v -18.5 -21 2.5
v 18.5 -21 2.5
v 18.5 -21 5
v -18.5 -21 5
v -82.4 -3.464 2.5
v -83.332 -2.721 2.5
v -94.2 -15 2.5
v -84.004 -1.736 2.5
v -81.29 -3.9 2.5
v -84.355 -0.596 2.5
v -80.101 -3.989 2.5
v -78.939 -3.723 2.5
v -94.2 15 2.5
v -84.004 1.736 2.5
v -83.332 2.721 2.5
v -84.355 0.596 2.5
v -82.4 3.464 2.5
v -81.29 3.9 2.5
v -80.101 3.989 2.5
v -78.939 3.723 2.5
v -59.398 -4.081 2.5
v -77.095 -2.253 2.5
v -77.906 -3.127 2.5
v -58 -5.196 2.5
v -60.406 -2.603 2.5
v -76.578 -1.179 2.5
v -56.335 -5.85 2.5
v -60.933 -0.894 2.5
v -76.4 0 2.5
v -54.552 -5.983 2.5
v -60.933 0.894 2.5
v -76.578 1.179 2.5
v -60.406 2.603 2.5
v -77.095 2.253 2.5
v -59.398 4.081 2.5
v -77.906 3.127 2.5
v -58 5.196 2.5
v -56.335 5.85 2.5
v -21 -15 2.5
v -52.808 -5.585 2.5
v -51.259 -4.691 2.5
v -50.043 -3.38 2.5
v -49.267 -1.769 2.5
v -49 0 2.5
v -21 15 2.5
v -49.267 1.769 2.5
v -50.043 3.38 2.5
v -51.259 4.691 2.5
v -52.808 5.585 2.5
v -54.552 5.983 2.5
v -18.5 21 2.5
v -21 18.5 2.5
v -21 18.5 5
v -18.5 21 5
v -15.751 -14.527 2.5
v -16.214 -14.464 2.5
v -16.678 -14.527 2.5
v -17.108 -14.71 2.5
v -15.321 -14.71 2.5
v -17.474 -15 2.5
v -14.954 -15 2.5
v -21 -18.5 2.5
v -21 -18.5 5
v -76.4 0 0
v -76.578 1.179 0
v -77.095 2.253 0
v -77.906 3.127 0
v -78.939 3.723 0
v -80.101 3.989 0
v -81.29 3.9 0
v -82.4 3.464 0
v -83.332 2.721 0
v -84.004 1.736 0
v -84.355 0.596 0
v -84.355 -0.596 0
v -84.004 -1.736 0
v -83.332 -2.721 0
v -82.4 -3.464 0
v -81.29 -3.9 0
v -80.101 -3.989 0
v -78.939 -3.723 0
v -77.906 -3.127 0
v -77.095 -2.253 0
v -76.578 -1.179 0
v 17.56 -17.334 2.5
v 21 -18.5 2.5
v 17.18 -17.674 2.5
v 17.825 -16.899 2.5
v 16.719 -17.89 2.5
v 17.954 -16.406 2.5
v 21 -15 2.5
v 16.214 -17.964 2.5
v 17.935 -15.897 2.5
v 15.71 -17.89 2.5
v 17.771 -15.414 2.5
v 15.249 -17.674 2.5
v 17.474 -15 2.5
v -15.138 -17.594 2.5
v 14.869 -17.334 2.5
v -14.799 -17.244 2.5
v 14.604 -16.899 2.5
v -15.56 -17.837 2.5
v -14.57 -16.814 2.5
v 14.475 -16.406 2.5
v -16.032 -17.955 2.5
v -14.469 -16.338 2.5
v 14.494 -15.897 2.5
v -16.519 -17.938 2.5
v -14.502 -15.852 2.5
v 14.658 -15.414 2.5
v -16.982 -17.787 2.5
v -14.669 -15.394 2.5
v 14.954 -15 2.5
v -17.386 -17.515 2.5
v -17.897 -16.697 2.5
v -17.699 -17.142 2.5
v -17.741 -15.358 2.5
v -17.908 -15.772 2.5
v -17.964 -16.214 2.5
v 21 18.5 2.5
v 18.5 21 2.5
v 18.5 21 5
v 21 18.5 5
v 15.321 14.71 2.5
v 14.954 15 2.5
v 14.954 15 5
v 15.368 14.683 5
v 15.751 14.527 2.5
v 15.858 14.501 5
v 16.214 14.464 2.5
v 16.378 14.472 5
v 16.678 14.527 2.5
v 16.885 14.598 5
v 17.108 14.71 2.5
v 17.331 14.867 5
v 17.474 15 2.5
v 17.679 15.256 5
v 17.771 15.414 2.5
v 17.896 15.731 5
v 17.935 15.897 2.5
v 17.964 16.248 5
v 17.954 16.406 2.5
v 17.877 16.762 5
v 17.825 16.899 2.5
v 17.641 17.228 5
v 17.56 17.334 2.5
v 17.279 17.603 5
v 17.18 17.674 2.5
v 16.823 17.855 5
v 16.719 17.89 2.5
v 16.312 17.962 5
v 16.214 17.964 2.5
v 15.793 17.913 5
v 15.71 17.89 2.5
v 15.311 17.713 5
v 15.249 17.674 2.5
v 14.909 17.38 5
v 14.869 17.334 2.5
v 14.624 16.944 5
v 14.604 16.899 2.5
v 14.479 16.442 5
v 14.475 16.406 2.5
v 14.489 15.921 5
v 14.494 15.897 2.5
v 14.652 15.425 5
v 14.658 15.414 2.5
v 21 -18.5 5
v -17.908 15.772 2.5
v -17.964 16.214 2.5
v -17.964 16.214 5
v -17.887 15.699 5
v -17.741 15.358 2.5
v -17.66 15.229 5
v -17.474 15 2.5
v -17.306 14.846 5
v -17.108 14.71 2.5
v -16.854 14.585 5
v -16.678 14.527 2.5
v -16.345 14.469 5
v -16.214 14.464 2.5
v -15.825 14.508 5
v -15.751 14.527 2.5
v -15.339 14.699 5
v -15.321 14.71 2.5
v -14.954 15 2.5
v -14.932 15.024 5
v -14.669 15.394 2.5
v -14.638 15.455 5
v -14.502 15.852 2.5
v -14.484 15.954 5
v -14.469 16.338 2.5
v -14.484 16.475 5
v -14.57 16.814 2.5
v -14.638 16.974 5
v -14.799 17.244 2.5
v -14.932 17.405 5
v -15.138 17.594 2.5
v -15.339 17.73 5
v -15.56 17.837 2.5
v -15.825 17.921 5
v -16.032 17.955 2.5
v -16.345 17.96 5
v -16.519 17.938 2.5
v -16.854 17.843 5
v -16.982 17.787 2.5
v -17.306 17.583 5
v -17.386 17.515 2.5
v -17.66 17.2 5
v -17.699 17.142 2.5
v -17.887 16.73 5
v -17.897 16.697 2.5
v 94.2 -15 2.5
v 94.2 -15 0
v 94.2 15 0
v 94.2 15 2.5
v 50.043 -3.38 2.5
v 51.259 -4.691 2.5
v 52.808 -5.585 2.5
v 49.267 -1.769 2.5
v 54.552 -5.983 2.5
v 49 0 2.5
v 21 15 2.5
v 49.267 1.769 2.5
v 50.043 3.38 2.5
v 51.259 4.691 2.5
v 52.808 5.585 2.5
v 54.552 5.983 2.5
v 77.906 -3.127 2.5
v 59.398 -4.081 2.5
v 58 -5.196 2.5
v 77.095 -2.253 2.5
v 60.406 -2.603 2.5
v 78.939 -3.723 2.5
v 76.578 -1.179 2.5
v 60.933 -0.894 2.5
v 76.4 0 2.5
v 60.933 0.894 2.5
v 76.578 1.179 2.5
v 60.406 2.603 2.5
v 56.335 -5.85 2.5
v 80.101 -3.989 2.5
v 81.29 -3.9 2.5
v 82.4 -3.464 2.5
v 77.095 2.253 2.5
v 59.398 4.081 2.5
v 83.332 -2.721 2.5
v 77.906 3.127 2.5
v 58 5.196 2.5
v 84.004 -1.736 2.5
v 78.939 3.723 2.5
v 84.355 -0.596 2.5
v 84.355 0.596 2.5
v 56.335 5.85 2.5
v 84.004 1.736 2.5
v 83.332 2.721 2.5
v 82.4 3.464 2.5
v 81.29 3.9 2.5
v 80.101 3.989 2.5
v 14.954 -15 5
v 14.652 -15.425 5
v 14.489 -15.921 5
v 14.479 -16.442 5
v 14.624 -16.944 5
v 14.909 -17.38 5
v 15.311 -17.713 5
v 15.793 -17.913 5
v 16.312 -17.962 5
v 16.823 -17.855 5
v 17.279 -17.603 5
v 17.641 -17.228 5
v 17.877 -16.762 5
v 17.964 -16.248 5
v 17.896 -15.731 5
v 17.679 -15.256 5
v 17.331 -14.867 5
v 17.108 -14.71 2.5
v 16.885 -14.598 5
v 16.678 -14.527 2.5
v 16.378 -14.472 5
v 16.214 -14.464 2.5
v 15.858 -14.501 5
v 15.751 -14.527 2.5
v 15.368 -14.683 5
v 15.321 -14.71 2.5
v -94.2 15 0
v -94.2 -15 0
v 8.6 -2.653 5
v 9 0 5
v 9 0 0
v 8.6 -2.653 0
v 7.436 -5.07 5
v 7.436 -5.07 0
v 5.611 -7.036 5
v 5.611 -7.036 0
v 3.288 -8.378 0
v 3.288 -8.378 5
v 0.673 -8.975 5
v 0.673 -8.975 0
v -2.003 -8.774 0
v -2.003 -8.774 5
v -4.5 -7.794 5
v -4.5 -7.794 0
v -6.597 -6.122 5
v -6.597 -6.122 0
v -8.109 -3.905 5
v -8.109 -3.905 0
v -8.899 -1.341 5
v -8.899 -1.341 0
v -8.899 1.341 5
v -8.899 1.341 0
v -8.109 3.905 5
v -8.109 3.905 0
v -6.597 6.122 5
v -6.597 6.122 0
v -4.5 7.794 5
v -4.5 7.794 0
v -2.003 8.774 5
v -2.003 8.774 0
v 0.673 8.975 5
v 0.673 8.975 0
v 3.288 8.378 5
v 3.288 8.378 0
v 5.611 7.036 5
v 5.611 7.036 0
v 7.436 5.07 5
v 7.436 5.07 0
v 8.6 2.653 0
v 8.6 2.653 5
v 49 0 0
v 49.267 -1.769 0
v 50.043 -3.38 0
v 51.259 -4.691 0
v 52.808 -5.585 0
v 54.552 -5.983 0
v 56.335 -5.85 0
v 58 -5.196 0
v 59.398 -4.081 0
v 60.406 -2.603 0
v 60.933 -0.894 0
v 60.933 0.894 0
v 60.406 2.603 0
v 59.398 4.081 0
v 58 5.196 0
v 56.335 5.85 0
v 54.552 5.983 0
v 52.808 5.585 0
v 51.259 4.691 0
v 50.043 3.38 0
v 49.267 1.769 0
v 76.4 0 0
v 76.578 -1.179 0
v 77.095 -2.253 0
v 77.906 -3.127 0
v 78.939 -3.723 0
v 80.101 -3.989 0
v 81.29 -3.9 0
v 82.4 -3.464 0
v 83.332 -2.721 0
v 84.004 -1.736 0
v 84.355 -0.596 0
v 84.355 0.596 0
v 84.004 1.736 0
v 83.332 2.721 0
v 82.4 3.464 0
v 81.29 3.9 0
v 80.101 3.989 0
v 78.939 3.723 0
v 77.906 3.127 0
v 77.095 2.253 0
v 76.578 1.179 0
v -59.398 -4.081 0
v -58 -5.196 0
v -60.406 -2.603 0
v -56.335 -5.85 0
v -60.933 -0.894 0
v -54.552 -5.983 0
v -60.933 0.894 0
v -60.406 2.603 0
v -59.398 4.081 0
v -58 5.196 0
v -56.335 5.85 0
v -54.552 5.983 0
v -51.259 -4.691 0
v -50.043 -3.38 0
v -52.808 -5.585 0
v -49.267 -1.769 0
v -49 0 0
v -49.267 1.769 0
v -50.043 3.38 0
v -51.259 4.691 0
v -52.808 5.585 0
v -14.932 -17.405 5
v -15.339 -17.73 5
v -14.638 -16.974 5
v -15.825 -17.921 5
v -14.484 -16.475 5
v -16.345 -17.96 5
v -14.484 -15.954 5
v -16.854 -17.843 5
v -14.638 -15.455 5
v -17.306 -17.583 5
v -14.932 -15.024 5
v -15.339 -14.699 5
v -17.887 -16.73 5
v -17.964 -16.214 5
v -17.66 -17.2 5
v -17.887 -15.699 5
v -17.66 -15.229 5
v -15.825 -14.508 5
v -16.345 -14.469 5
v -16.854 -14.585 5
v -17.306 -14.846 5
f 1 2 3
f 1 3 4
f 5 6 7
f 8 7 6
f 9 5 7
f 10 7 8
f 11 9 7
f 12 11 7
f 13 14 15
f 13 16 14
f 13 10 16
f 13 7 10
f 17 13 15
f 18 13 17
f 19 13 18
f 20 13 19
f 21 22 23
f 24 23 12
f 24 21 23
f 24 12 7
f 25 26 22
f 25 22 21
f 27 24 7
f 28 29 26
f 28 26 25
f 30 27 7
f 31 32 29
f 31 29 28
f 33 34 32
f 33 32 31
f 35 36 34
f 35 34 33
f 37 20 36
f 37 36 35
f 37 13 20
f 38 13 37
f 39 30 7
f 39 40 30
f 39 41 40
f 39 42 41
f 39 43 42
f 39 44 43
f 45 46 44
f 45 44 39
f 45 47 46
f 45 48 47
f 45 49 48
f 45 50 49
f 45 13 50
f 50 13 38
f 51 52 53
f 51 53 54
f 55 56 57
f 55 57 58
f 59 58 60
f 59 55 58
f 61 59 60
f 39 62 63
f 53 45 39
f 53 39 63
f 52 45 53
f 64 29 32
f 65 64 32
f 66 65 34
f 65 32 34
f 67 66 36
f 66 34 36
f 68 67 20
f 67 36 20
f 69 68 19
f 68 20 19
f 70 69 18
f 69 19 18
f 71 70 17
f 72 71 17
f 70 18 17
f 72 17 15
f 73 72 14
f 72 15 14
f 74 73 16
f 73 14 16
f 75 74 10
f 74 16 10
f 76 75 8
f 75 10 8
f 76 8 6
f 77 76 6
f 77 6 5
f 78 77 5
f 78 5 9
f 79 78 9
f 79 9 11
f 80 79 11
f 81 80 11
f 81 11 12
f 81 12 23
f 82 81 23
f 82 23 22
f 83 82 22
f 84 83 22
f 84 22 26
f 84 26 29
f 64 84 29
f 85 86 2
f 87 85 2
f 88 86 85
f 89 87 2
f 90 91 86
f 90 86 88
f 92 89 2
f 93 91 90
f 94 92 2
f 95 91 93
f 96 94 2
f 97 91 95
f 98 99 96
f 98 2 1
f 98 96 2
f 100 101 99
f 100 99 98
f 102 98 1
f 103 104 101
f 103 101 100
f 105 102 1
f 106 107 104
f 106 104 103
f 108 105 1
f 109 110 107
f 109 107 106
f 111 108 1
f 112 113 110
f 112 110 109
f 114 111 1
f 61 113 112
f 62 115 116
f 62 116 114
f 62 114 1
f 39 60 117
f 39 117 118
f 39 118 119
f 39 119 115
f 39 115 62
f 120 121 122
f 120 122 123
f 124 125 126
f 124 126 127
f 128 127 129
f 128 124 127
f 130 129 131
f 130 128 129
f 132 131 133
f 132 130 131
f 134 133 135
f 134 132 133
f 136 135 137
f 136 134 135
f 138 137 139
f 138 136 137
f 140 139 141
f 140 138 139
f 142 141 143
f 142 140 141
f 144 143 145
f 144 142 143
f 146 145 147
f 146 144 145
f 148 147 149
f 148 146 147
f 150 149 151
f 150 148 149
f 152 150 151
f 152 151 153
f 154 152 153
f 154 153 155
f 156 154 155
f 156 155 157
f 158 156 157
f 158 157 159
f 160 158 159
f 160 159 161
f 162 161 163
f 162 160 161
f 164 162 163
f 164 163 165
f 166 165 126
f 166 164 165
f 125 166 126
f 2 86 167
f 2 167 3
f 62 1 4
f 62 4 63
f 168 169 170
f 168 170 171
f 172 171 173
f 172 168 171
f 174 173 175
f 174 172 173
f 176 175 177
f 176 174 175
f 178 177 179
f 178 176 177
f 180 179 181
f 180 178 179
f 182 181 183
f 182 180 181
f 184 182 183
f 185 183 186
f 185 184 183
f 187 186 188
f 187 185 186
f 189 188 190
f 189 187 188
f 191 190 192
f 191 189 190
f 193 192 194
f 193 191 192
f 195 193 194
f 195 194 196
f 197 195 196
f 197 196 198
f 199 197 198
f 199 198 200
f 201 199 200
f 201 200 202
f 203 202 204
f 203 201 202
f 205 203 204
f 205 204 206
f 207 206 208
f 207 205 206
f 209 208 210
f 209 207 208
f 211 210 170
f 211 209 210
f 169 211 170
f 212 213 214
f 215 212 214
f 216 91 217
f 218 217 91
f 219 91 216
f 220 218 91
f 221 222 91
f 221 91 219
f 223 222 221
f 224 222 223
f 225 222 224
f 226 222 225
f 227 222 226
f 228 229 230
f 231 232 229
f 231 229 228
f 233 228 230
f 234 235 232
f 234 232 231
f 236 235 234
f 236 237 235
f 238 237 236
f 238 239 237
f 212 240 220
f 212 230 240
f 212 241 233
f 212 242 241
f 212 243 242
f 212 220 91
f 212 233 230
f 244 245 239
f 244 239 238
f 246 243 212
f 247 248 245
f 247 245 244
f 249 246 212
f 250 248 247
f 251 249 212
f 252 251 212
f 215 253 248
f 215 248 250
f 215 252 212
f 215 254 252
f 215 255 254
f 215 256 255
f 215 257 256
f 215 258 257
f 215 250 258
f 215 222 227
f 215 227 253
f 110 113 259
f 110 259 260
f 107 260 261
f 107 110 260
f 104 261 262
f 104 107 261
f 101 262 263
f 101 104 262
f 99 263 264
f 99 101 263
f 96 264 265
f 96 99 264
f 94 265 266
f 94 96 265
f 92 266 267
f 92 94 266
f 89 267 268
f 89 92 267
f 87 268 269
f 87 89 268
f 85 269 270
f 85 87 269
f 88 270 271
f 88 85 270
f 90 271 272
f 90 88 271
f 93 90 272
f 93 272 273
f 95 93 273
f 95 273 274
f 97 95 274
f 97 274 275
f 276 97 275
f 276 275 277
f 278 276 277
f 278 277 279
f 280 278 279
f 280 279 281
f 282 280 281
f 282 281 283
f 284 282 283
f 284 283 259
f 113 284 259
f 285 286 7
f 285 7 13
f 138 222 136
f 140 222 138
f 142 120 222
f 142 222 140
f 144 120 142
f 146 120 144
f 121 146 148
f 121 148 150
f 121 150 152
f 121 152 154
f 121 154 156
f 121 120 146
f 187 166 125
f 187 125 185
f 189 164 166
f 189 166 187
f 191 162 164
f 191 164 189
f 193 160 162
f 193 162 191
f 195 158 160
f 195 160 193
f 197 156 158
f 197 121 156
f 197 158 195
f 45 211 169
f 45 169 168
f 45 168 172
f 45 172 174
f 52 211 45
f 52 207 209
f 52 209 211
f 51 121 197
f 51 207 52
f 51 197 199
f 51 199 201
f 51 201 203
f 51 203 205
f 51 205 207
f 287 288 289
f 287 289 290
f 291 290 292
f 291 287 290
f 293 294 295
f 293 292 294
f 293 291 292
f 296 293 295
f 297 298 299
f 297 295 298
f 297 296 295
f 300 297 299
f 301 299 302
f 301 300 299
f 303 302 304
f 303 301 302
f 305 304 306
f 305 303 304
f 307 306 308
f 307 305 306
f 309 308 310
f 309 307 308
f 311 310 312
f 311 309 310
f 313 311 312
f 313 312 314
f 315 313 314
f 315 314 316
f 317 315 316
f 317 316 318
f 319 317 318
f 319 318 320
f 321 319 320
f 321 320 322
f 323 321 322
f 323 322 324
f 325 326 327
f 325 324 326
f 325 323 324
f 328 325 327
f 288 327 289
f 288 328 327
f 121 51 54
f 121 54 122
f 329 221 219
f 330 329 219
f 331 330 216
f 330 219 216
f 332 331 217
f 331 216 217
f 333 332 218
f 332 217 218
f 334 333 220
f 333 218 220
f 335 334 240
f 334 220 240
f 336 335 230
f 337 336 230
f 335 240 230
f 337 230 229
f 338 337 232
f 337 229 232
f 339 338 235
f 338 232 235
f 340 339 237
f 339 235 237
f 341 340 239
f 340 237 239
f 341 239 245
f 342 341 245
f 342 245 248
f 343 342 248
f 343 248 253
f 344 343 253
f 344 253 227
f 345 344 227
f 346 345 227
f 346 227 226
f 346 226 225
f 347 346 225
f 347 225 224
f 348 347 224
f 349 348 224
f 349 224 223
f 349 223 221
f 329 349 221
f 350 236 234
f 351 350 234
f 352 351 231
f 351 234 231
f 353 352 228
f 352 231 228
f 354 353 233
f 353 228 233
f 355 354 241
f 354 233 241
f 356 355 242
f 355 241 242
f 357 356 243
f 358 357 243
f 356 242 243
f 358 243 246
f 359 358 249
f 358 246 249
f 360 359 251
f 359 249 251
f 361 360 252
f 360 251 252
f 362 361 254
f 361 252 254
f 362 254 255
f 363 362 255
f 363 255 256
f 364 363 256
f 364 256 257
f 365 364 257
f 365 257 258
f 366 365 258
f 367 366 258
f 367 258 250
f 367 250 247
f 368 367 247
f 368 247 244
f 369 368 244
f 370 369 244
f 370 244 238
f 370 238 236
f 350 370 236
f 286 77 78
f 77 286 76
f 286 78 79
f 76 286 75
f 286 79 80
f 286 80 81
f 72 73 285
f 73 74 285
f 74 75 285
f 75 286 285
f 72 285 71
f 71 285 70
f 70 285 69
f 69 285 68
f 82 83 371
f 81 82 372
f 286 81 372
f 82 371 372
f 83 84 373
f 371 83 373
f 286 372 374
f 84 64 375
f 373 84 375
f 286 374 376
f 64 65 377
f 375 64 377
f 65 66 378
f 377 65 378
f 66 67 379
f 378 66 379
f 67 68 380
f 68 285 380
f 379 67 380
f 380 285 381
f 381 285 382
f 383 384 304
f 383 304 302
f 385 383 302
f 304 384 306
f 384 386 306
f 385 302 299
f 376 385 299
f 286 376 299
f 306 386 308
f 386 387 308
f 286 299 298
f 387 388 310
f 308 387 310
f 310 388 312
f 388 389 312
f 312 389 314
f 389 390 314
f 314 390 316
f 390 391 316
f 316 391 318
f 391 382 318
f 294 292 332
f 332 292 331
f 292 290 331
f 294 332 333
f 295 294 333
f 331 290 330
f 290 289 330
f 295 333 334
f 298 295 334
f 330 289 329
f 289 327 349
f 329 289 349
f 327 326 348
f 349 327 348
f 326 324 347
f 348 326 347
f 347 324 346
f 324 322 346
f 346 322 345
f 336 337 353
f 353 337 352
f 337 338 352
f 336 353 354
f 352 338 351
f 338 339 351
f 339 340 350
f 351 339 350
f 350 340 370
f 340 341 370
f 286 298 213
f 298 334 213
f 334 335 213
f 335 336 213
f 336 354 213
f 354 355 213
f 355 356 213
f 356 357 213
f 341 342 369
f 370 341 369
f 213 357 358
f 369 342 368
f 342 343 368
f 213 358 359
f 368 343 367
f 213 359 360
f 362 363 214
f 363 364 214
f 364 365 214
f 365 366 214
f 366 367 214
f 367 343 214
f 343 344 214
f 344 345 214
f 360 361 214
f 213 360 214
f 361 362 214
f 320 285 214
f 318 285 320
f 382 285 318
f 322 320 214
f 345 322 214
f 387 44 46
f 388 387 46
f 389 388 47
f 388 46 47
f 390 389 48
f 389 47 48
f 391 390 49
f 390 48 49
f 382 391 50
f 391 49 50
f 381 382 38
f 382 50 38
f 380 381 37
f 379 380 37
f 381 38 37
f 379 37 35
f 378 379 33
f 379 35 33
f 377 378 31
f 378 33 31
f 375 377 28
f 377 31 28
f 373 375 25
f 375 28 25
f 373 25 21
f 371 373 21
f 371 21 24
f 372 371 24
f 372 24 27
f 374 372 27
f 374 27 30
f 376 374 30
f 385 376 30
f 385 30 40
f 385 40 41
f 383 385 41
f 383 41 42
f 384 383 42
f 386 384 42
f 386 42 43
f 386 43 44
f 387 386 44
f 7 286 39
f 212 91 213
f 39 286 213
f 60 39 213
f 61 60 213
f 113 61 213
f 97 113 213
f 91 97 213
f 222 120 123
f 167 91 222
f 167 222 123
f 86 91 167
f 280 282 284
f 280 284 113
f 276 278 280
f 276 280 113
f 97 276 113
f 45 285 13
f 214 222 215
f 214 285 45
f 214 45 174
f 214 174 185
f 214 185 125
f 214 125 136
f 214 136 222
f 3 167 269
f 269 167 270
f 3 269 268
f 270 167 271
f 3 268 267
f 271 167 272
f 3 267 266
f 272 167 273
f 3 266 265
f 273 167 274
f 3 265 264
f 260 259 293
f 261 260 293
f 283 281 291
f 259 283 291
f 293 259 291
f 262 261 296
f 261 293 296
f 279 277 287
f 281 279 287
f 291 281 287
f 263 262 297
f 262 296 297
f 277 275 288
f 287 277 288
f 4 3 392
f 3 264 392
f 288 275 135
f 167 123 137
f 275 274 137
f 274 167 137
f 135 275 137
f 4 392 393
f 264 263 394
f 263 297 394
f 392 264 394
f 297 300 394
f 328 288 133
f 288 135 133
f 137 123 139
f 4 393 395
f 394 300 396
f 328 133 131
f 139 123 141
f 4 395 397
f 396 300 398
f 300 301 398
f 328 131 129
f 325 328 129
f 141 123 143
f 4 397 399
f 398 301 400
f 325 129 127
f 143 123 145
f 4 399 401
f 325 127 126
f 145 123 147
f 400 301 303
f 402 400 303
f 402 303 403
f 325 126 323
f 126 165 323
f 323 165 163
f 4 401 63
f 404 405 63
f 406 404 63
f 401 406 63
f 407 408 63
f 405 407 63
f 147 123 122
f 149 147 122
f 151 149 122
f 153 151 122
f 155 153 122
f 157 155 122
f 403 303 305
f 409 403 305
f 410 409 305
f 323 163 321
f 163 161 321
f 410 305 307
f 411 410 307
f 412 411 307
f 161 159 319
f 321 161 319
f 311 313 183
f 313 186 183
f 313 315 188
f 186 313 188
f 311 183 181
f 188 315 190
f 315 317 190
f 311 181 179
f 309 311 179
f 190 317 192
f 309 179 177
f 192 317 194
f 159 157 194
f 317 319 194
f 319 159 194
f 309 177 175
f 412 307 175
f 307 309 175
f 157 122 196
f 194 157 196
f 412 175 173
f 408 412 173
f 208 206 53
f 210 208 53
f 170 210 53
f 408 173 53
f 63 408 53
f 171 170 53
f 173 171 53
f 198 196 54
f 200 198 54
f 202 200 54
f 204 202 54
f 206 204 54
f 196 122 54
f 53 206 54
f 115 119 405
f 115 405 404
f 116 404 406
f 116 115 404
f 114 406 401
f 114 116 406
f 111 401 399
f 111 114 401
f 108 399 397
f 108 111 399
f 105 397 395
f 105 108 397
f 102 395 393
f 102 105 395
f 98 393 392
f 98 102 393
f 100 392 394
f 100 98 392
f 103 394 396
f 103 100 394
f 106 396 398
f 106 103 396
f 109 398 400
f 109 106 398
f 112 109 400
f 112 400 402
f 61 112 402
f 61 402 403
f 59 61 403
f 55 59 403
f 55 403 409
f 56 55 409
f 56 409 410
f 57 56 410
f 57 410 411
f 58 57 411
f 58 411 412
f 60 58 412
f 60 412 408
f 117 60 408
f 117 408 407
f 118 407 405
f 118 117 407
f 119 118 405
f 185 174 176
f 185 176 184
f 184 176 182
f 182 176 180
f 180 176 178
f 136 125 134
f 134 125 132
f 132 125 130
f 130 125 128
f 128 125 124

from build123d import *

# Parameters (mm, degrees)
SKETCH1_W               = 188.4
SKETCH1_H               = 30
BOSS_EXTRUDE1_DEPTH     = 2.5
SKETCH2_R               = 6
SKETCH2_R_2             = 4
CUT_EXTRUDE2_DEPTH      = 96.419547264
SKETCH3_R               = 1.75
BOSS_EXTRUDE4_DEPTH     = 2.5
CUT_EXTRUDE5_DEPTH      = 14.5
CUT_EXTRUDE5_DEPTH_BACK = 14.5
SKETCH5_R               = 9


with BuildPart() as part:
    # Sketch1 → Boss-Extrude1 (new body)
    with BuildSketch(Plane.XY):
        Rectangle(SKETCH1_W, SKETCH1_H)
    extrude(amount=BOSS_EXTRUDE1_DEPTH)

    # Sketch2 → Cut-Extrude2 (cut, through all)
    with BuildSketch(Plane.XY.offset(2.5)):
        with Locations((-55, 0)):
            Circle(SKETCH2_R)
        with Locations(Location((55, 0, 0), (0, 0, 180))):
            Circle(SKETCH2_R)
        Circle(SKETCH2_R)
        with Locations((-80.4, 0)):
            Circle(SKETCH2_R_2)
        with Locations(Location((80.4, 0, 0), (0, 0, 180))):
            Circle(SKETCH2_R_2)
    extrude(amount=-CUT_EXTRUDE2_DEPTH, mode=Mode.SUBTRACT)

    # Sketch3 → Boss-Extrude4 (add)
    with BuildSketch(Plane.XY.offset(2.5)):
        Polygon((-21, 18.5), (-18.5, 21), (18.5, 21), (21, 18.5), (21, -18.5), (18.5, -21), (-18.5, -21), (-21, -18.5), align=None)
        with Locations(Location((16.214466094, 16.214466094, 0), (0, 0, 223.946041773))):
            Circle(SKETCH3_R, mode=Mode.SUBTRACT)
        with Locations(Location((-16.214466094, -16.214466094, 0), (0, 0, 180))):
            Circle(SKETCH3_R, mode=Mode.SUBTRACT)
        with Locations(Location((16.214466094, -16.214466094, 0), (0, 0, 136.053958227))):
            Circle(SKETCH3_R, mode=Mode.SUBTRACT)
        with Locations(Location((-16.214466094, 16.214466094, 0), (0, 0, 180))):
            Circle(SKETCH3_R, mode=Mode.SUBTRACT)
    extrude(amount=BOSS_EXTRUDE4_DEPTH)

    # Sketch5 → Cut-Extrude5 (cut, two sides: drawn at the far end of the back side and taken through both)
    with BuildSketch(Plane(origin=(0, 0, 2.5), x_dir=(-1, 0, 0), z_dir=(0, 0, -1)).offset(-CUT_EXTRUDE5_DEPTH_BACK)):
        with Locations(Location((0, 0, 0), (0, 0, 180))):
            Circle(SKETCH5_R)
    extrude(amount=CUT_EXTRUDE5_DEPTH + CUT_EXTRUDE5_DEPTH_BACK, mode=Mode.SUBTRACT)


solid = part.part
